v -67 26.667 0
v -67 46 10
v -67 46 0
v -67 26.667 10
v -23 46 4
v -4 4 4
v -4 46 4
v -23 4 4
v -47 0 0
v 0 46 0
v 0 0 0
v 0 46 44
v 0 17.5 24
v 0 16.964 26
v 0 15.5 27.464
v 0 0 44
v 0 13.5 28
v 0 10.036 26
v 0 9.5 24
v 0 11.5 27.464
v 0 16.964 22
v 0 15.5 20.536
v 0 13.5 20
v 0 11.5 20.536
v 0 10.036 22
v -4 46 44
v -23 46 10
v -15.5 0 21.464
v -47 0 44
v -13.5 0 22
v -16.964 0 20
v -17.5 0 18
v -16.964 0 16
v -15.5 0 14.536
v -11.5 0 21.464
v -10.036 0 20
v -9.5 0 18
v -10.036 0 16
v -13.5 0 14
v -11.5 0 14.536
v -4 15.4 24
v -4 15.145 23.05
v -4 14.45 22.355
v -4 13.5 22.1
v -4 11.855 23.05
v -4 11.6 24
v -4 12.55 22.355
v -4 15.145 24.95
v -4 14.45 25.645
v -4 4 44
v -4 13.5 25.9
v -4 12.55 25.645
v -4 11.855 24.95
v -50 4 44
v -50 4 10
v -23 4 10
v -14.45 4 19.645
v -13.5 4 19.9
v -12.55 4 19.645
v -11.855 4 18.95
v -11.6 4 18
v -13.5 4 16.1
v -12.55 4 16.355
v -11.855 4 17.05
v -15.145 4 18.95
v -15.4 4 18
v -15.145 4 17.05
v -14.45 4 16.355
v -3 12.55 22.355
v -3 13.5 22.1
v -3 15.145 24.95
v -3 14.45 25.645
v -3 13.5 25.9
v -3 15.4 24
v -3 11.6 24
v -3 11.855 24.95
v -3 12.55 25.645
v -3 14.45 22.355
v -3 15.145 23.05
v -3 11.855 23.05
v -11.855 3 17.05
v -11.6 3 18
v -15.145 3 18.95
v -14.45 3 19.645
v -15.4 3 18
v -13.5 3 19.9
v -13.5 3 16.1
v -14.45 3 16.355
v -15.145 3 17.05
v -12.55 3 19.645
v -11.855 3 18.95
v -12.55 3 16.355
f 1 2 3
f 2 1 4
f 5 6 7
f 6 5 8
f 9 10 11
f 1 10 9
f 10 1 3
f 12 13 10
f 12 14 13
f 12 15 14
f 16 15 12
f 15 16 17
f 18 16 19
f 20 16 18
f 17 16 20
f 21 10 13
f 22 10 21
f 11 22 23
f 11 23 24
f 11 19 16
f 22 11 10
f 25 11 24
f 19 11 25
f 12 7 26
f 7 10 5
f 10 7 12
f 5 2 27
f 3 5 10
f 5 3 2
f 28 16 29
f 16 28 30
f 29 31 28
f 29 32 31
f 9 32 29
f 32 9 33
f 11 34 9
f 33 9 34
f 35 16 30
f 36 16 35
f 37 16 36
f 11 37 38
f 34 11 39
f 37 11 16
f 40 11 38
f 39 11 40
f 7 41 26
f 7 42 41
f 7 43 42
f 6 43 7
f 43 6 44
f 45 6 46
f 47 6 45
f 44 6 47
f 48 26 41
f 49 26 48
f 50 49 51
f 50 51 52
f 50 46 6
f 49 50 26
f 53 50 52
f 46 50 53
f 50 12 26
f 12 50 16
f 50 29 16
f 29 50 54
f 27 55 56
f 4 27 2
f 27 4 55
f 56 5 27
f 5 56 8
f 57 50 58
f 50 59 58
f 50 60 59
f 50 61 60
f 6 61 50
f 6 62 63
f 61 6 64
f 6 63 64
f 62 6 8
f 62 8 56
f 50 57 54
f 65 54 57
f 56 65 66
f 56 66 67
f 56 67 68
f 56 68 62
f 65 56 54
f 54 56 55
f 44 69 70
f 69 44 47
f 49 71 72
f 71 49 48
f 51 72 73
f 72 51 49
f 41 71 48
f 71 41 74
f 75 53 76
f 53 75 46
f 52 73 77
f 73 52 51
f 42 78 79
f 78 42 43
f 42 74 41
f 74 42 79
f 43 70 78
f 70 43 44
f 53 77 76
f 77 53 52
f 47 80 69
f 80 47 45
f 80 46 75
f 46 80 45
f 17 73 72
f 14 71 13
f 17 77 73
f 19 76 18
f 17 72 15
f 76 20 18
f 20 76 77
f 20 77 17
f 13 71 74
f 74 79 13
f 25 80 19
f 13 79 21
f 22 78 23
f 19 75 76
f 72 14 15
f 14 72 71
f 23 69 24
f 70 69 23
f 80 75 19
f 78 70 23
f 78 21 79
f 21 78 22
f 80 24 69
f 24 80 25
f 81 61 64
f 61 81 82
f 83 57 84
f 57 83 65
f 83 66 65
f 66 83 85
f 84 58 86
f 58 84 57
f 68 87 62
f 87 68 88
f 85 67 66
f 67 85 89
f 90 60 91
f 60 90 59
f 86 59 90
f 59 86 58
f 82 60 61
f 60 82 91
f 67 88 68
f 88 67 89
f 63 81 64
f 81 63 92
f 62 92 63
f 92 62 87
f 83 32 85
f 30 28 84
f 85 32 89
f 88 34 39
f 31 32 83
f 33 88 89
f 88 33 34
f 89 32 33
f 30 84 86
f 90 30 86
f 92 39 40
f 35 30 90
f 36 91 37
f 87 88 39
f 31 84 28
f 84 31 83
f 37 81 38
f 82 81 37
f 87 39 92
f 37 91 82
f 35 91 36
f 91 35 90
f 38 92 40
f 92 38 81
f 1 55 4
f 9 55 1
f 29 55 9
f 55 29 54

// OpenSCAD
difference(){
	scale(v = [-1, 1, 1]) {
		union() {
			cube(size = [67, 46, 4]);
			translate(v = [0, 0, 4]) {
				cube(size = [4, 46, 40]);
			}
			translate(v = [23, 0, 4]) {
				cube(size = [44, 46, 6]);
			}
			translate(v = [0, 0, 4]) {
				cube(size = [67, 4, 40]);
			}
		}
	}
	/* Holes Below*/
	scale(v = [-1, 1, 1]){
		union(){
			translate(v = [47, 0, 0]) {
				rotate(a = -36.8700000000, v = [0, 0, 1]) {
					cube(size = [50, 50, 50]);
				}
			}
			translate(v = [0, 13.5000000000, 24.0000000000]) {
				rotate(a = -90, v = [0, 1, 0]) {
					union() {
						union() {
							translate(v = [0, 0, -5]) {
								cylinder($fn = 12, h = 5, r = 1.9000000000);
							}
							translate(v = [0, 0, -3]) {
								cylinder($fn = 12, h = 3, r1 = 1.9000000000, r2 = 4);
							}
						}
						cylinder($fn = 12, h = 1, r = 4);
					}
				}
			}
			translate(v = [13.5000000000, 0, 18.0000000000]) {
				rotate(a = 90, v = [1, 0, 0]) {
					union() {
						union() {
							translate(v = [0, 0, -5]) {
								cylinder($fn = 12, h = 5, r = 1.9000000000);
							}
							translate(v = [0, 0, -3]) {
								cylinder($fn = 12, h = 3, r1 = 1.9000000000, r2 = 4);
							}
						}
						cylinder($fn = 12, h = 1, r = 4);
					}
				}
			}
		}
	} /* End Holes */ 
}
